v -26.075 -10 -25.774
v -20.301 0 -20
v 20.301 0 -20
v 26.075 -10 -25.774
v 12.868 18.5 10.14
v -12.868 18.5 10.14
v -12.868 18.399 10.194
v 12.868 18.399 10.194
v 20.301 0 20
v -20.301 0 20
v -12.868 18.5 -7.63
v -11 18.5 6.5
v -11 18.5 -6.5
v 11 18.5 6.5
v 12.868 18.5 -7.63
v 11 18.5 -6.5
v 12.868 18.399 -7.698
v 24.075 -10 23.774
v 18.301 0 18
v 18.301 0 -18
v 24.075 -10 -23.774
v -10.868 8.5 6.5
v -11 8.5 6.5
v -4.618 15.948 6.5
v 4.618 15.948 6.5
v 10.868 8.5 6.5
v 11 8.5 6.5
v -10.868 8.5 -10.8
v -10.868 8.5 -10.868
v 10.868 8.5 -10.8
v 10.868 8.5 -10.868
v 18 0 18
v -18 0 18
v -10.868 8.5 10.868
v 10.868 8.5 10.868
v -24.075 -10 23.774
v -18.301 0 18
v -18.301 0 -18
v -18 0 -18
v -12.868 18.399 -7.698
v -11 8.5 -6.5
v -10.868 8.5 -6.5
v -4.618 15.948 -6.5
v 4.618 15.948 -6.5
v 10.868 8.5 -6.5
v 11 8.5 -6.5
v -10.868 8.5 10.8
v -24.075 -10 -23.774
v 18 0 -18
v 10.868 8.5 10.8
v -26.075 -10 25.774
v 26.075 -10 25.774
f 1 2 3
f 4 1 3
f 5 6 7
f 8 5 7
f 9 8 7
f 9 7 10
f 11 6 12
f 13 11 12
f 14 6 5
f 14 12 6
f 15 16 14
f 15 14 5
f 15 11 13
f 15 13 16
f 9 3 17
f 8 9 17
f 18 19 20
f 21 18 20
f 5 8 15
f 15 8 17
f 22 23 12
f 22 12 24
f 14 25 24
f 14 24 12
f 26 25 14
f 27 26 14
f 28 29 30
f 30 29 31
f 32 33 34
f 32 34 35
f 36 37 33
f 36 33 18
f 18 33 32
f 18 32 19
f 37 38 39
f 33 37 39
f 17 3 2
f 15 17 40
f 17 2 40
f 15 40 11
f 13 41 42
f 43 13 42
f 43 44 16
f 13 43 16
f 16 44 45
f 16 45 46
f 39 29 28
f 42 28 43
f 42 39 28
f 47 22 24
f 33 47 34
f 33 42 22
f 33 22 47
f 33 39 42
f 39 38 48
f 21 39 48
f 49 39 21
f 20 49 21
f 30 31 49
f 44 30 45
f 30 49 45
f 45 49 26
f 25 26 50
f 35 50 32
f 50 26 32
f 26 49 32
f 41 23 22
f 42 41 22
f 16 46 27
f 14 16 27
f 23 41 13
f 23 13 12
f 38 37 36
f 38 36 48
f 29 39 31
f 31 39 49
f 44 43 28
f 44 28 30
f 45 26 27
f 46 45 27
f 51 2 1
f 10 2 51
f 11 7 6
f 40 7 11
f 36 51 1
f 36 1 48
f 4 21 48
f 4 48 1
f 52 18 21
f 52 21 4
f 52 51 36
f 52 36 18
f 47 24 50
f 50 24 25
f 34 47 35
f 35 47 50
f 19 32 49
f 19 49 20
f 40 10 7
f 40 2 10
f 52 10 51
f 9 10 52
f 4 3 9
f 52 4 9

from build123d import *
from OCP.BRepFilletAPI import BRepFilletAPI_MakeChamfer

# Parameters (mm, degrees)
SKETCH1_W               = 40
SKETCH1_H               = 40
BOSS_EXTRUDE1_DEPTH     = 8.5
BOSS_EXTRUDE1_TAPER     = 40
SKETCH2_W               = 36
SKETCH2_H               = 36
CUT_EXTRUDE1_DEPTH      = 15
CUT_EXTRUDE1_DRAFT      = -40
SKETCH4_W               = 25.73530627
SKETCH4_H               = 25.73530627
BOSS_EXTRUDE3_DEPTH     = 10
SKETCH5_W               = 22
SKETCH5_H               = 13
CUT_EXTRUDE2_DEPTH      = 31.000000133
CHAMFER2_SIZE           = 12
CHAMFER2_SIZE_2         = 9.89892863
CUT_EXTRUDE3_DEPTH      = 35.154586706
CUT_EXTRUDE3_DEPTH_BACK = 35.154586706
CHAMFER3_SIZE           = 4.3
CHAMFER3_SIZE2          = 7.447818473
CUT_EXTRUDE4_DEPTH      = 35.154586706
CUT_EXTRUDE4_DEPTH_BACK = 35.154586706
SKETCH9_W               = 40.602605658
SKETCH9_H               = 40
BOSS_EXTRUDE4_DEPTH     = 10
BOSS_EXTRUDE4_DRAFT     = -30
SKETCH10_W              = 36.602605658
SKETCH10_H              = 36
CUT_EXTRUDE5_DEPTH      = 10
CUT_EXTRUDE5_DRAFT      = 30


with BuildPart() as part:
    # Sketch1 → Boss-Extrude1 (new body)
    with BuildSketch(Plane(origin=(0, 0, 0), x_dir=(1, 0, 0), z_dir=(0, 1, 0))):
        Rectangle(SKETCH1_W, SKETCH1_H)
    extrude(amount=BOSS_EXTRUDE1_DEPTH, taper=BOSS_EXTRUDE1_TAPER)


with BuildPart() as cut_extrude1_tool:
    # Sketch2 → Cut-Extrude1 (with draft: the straight prism first)
    with BuildSketch(Plane.XZ):
        Rectangle(SKETCH2_W, SKETCH2_H)
    extrude(amount=-CUT_EXTRUDE1_DEPTH)
    # Cut-Extrude1: the draft: its side faces are tilted about the plane it starts from
    cut_extrude1_sides = [cut_extrude1_tool.faces().sort_by_distance(p)[0] for p in [
        (0, 7.5, -18),
        (18, 7.5, 0),
        (0, 7.5, 18),
        (-18, 7.5, 0),
    ]]
    draft(cut_extrude1_sides, Plane.XZ, CUT_EXTRUDE1_DRAFT)


with BuildPart() as part_1:
    add(part.part)

    # Cut-Extrude1: cut by cut_extrude1_tool
    add(cut_extrude1_tool.part, mode=Mode.SUBTRACT)

    # Sketch4 → Boss-Extrude3 (add)
    with BuildSketch(Plane(origin=(0, 8.5, 0), x_dir=(1, 0, 0), z_dir=(0, 1, 0))):
        Rectangle(SKETCH4_W, SKETCH4_H)
    extrude(amount=BOSS_EXTRUDE3_DEPTH)

    # Sketch5 → Cut-Extrude2 (cut, through all)
    with BuildSketch(Plane.XZ.offset(-8.5)):
        Rectangle(SKETCH5_W, SKETCH5_H)
    extrude(amount=-CUT_EXTRUDE2_DEPTH, mode=Mode.SUBTRACT)

    # Chamfer2
    # the kernel refuses this chamfer: 12, 9.89892863 mm, written as the material it adds along each edge
    with BuildSketch(Plane(origin=(12.867653135, 8.5, 44.011128682), x_dir=(0.6427876096865404, -0.7660444431189772, 0), z_dir=(0, 0, -1))) as chamfer2_piece_1_section:
        Polygon((CHAMFER2_SIZE, 0), (-CHAMFER2_SIZE_2 * 0.766044443108, -CHAMFER2_SIZE_2 * 0.642787609677), (0, 0), align=None)
    chamfer2_piece_1 = extrude(amount=88.022257365, mode=Mode.PRIVATE)
    chamfer2_piece_1 = split(chamfer2_piece_1, bisect_by=Plane(origin=(12.867653135, 0, 44.011128682), z_dir=(0, 1, 0)), keep=Keep.TOP, mode=Mode.PRIVATE)
    chamfer2_piece_1 = split(chamfer2_piece_1, bisect_by=Plane(origin=(12.867653135, -0.927920344, 20.676206983), z_dir=(0, -0.37460659341591307, -0.927183854566787)), keep=Keep.TOP, mode=Mode.PRIVATE)
    chamfer2_piece_1 = split(chamfer2_piece_1, bisect_by=Plane(origin=(12.867653135, 29.644778588, -8.32403482), z_dir=(0, -0.3746065934159128, 0.9271838545667871)), keep=Keep.TOP, mode=Mode.PRIVATE)
    add(chamfer2_piece_1)
    with BuildSketch(Plane(origin=(-12.867653135, 8.5, -44.011128682), x_dir=(-0.6427876096865406, -0.766044443118977, 0), z_dir=(0, 0, 1))) as chamfer2_piece_2_section:
        Polygon((CHAMFER2_SIZE, 0), (-CHAMFER2_SIZE_2 * 0.766044443108, -CHAMFER2_SIZE_2 * 0.642787609677), (0, 0), align=None)
    chamfer2_piece_2 = extrude(amount=88.022257365, mode=Mode.PRIVATE)
    chamfer2_piece_2 = split(chamfer2_piece_2, bisect_by=Plane(origin=(-12.867653135, 0, -44.011128682), z_dir=(0, 1, 0)), keep=Keep.TOP, mode=Mode.PRIVATE)
    chamfer2_piece_2 = split(chamfer2_piece_2, bisect_by=Plane(origin=(-12.867653135, -0.927920344, -20.676206983), z_dir=(0, -0.3746065934159128, 0.9271838545667871)), keep=Keep.TOP, mode=Mode.PRIVATE)
    chamfer2_piece_2 = split(chamfer2_piece_2, bisect_by=Plane(origin=(-12.867653135, 29.644778588, 8.32403482), z_dir=(0, -0.37460659341591307, -0.927183854566787)), keep=Keep.TOP, mode=Mode.PRIVATE)
    add(chamfer2_piece_2)
    with BuildSketch(Plane(origin=(-44.011128682, 8.5, 12.867653135), x_dir=(0, -0.766044443118977, 0.6427876096865405), z_dir=(1, 0, 0))) as chamfer2_piece_3_section:
        Polygon((CHAMFER2_SIZE, 0), (-CHAMFER2_SIZE_2 * 0.766044443108, -CHAMFER2_SIZE_2 * 0.642787609677), (0, 0), align=None)
    chamfer2_piece_3 = extrude(amount=88.022257365, mode=Mode.PRIVATE)
    chamfer2_piece_3 = split(chamfer2_piece_3, bisect_by=Plane(origin=(-44.011128682, 0, 12.867653135), z_dir=(0, 1, 0)), keep=Keep.TOP, mode=Mode.PRIVATE)
    chamfer2_piece_3 = split(chamfer2_piece_3, bisect_by=Plane(origin=(-20.676206983, -0.927920344, 12.867653135), z_dir=(0.927183854566787, -0.37460659341591307, 0)), keep=Keep.TOP, mode=Mode.PRIVATE)
    chamfer2_piece_3 = split(chamfer2_piece_3, bisect_by=Plane(origin=(8.32403482, 29.644778588, 12.867653135), z_dir=(-0.9271838545667872, -0.37460659341591274, 0)), keep=Keep.TOP, mode=Mode.PRIVATE)
    add(chamfer2_piece_3)
    with BuildSketch(Plane(origin=(44.011128682, 8.5, -12.867653135), x_dir=(0, -0.766044443118977, -0.6427876096865405), z_dir=(-1, 0, 0))) as chamfer2_piece_4_section:
        Polygon((CHAMFER2_SIZE, 0), (-CHAMFER2_SIZE_2 * 0.766044443108, -CHAMFER2_SIZE_2 * 0.642787609677), (0, 0), align=None)
    chamfer2_piece_4 = extrude(amount=88.022257365, mode=Mode.PRIVATE)
    chamfer2_piece_4 = split(chamfer2_piece_4, bisect_by=Plane(origin=(44.011128682, 0, -12.867653135), z_dir=(0, 1, 0)), keep=Keep.TOP, mode=Mode.PRIVATE)
    chamfer2_piece_4 = split(chamfer2_piece_4, bisect_by=Plane(origin=(-8.32403482, 29.644778588, -12.867653135), z_dir=(0.927183854566787, -0.37460659341591307, 0)), keep=Keep.TOP, mode=Mode.PRIVATE)
    chamfer2_piece_4 = split(chamfer2_piece_4, bisect_by=Plane(origin=(20.676206983, -0.927920344, -12.867653135), z_dir=(-0.9271838545667872, -0.37460659341591274, 0)), keep=Keep.TOP, mode=Mode.PRIVATE)
    add(chamfer2_piece_4)

    # Sketch7 → Cut-Extrude3 (cut, two sides: drawn at the far end of the back side and taken through both)
    with BuildSketch(Plane(origin=(0, 0, 0), x_dir=(0, 0, -1), z_dir=(1, 0, 0)).offset(-CUT_EXTRUDE3_DEPTH_BACK)):
        Polygon((-20, 0), (-24.78585356, 0), (-24.78585356, 18.532984169), (-10.14, 18.5), align=None)
    extrude(amount=CUT_EXTRUDE3_DEPTH + CUT_EXTRUDE3_DEPTH_BACK, mode=Mode.SUBTRACT)

    # Chamfer3: one chamfer whose edges measure the first distance from different faces: ONE call of the kernel's chamfer builder (chamfer() names one face for all edges)
    chamfer3_edges_1 = [part_1.edges().sort_by_distance(p)[0] for p in [
        (0, 8.5, 6.5),
    ]]
    chamfer3_side_1 = [part_1.faces().sort_by_distance(p)[0] for p in [
        (0, 8.5, 8.683826567),
    ]]
    chamfer3_edges_2 = [part_1.edges().sort_by_distance(p)[0] for p in [
        (0, 8.5, -6.5),
    ]]
    chamfer3_side_2 = [part_1.faces().sort_by_distance(p)[0] for p in [
        (0, 8.5, -8.683826567),
    ]]
    chamfer3 = BRepFilletAPI_MakeChamfer(part_1.part.solid().wrapped)
    for e in chamfer3_edges_1:
        chamfer3.Add(CHAMFER3_SIZE, CHAMFER3_SIZE2, e.wrapped, chamfer3_side_1[0].wrapped)  # the first distance lies on this face
    for e in chamfer3_edges_2:
        chamfer3.Add(CHAMFER3_SIZE, CHAMFER3_SIZE2, e.wrapped, chamfer3_side_2[0].wrapped)  # the first distance lies on this face
    add(Compound.cast(chamfer3.Shape()), mode=Mode.REPLACE)

    # Sketch8 → Cut-Extrude4 (cut, two sides: drawn at the far end of the back side and taken through both)
    with BuildSketch(Plane(origin=(0, 0, 0), x_dir=(0, 0, -1), z_dir=(1, 0, 0)).offset(-CUT_EXTRUDE4_DEPTH_BACK)):
        Polygon((7.63, 18.5), (12.867653135, 18.5), (21.160182577, 0), (20, 0), align=None)
    extrude(amount=CUT_EXTRUDE4_DEPTH + CUT_EXTRUDE4_DEPTH_BACK, mode=Mode.SUBTRACT)


with BuildPart() as boss_extrude4_tool:
    # Sketch9 → Boss-Extrude4 (with draft: the straight prism first)
    with BuildSketch(Plane.XZ):
        Rectangle(SKETCH9_W, SKETCH9_H)
    extrude(amount=BOSS_EXTRUDE4_DEPTH)
    # Boss-Extrude4: the draft: its side faces are tilted about the plane it starts from
    boss_extrude4_sides = [boss_extrude4_tool.faces().sort_by_distance(p)[0] for p in [
        (0, -5, -20),
        (20.301302829, -5, 0),
        (0, -5, 20),
        (-20.301302829, -5, 0),
    ]]
    draft(boss_extrude4_sides, Plane.XZ, BOSS_EXTRUDE4_DRAFT)


with BuildPart() as part_2:
    add(part_1.part)

    # Boss-Extrude4: add boss_extrude4_tool
    add(boss_extrude4_tool.part)


with BuildPart() as cut_extrude5_tool:
    # Sketch10 → Cut-Extrude5 (with draft: the straight prism first)
    with BuildSketch(Plane(origin=(0, 0, 0), x_dir=(1, 0, 0), z_dir=(0, 1, 0))):
        Rectangle(SKETCH10_W, SKETCH10_H)
    extrude(amount=-CUT_EXTRUDE5_DEPTH)
    # Cut-Extrude5: the draft: its side faces are tilted about the plane it starts from
    cut_extrude5_sides = [cut_extrude5_tool.faces().sort_by_distance(p)[0] for p in [
        (0, -5, 18),
        (18.301302829, -5, 0),
        (0, -5, -18),
        (-18.301302829, -5, 0),
    ]]
    draft(cut_extrude5_sides, Plane(origin=(0, 0, 0), x_dir=(1, 0, 0), z_dir=(0, 1, 0)), CUT_EXTRUDE5_DRAFT)


with BuildPart() as part_3:
    add(part_2.part)

    # Cut-Extrude5: cut by cut_extrude5_tool
    add(cut_extrude5_tool.part, mode=Mode.SUBTRACT)


solid = part_3.part
